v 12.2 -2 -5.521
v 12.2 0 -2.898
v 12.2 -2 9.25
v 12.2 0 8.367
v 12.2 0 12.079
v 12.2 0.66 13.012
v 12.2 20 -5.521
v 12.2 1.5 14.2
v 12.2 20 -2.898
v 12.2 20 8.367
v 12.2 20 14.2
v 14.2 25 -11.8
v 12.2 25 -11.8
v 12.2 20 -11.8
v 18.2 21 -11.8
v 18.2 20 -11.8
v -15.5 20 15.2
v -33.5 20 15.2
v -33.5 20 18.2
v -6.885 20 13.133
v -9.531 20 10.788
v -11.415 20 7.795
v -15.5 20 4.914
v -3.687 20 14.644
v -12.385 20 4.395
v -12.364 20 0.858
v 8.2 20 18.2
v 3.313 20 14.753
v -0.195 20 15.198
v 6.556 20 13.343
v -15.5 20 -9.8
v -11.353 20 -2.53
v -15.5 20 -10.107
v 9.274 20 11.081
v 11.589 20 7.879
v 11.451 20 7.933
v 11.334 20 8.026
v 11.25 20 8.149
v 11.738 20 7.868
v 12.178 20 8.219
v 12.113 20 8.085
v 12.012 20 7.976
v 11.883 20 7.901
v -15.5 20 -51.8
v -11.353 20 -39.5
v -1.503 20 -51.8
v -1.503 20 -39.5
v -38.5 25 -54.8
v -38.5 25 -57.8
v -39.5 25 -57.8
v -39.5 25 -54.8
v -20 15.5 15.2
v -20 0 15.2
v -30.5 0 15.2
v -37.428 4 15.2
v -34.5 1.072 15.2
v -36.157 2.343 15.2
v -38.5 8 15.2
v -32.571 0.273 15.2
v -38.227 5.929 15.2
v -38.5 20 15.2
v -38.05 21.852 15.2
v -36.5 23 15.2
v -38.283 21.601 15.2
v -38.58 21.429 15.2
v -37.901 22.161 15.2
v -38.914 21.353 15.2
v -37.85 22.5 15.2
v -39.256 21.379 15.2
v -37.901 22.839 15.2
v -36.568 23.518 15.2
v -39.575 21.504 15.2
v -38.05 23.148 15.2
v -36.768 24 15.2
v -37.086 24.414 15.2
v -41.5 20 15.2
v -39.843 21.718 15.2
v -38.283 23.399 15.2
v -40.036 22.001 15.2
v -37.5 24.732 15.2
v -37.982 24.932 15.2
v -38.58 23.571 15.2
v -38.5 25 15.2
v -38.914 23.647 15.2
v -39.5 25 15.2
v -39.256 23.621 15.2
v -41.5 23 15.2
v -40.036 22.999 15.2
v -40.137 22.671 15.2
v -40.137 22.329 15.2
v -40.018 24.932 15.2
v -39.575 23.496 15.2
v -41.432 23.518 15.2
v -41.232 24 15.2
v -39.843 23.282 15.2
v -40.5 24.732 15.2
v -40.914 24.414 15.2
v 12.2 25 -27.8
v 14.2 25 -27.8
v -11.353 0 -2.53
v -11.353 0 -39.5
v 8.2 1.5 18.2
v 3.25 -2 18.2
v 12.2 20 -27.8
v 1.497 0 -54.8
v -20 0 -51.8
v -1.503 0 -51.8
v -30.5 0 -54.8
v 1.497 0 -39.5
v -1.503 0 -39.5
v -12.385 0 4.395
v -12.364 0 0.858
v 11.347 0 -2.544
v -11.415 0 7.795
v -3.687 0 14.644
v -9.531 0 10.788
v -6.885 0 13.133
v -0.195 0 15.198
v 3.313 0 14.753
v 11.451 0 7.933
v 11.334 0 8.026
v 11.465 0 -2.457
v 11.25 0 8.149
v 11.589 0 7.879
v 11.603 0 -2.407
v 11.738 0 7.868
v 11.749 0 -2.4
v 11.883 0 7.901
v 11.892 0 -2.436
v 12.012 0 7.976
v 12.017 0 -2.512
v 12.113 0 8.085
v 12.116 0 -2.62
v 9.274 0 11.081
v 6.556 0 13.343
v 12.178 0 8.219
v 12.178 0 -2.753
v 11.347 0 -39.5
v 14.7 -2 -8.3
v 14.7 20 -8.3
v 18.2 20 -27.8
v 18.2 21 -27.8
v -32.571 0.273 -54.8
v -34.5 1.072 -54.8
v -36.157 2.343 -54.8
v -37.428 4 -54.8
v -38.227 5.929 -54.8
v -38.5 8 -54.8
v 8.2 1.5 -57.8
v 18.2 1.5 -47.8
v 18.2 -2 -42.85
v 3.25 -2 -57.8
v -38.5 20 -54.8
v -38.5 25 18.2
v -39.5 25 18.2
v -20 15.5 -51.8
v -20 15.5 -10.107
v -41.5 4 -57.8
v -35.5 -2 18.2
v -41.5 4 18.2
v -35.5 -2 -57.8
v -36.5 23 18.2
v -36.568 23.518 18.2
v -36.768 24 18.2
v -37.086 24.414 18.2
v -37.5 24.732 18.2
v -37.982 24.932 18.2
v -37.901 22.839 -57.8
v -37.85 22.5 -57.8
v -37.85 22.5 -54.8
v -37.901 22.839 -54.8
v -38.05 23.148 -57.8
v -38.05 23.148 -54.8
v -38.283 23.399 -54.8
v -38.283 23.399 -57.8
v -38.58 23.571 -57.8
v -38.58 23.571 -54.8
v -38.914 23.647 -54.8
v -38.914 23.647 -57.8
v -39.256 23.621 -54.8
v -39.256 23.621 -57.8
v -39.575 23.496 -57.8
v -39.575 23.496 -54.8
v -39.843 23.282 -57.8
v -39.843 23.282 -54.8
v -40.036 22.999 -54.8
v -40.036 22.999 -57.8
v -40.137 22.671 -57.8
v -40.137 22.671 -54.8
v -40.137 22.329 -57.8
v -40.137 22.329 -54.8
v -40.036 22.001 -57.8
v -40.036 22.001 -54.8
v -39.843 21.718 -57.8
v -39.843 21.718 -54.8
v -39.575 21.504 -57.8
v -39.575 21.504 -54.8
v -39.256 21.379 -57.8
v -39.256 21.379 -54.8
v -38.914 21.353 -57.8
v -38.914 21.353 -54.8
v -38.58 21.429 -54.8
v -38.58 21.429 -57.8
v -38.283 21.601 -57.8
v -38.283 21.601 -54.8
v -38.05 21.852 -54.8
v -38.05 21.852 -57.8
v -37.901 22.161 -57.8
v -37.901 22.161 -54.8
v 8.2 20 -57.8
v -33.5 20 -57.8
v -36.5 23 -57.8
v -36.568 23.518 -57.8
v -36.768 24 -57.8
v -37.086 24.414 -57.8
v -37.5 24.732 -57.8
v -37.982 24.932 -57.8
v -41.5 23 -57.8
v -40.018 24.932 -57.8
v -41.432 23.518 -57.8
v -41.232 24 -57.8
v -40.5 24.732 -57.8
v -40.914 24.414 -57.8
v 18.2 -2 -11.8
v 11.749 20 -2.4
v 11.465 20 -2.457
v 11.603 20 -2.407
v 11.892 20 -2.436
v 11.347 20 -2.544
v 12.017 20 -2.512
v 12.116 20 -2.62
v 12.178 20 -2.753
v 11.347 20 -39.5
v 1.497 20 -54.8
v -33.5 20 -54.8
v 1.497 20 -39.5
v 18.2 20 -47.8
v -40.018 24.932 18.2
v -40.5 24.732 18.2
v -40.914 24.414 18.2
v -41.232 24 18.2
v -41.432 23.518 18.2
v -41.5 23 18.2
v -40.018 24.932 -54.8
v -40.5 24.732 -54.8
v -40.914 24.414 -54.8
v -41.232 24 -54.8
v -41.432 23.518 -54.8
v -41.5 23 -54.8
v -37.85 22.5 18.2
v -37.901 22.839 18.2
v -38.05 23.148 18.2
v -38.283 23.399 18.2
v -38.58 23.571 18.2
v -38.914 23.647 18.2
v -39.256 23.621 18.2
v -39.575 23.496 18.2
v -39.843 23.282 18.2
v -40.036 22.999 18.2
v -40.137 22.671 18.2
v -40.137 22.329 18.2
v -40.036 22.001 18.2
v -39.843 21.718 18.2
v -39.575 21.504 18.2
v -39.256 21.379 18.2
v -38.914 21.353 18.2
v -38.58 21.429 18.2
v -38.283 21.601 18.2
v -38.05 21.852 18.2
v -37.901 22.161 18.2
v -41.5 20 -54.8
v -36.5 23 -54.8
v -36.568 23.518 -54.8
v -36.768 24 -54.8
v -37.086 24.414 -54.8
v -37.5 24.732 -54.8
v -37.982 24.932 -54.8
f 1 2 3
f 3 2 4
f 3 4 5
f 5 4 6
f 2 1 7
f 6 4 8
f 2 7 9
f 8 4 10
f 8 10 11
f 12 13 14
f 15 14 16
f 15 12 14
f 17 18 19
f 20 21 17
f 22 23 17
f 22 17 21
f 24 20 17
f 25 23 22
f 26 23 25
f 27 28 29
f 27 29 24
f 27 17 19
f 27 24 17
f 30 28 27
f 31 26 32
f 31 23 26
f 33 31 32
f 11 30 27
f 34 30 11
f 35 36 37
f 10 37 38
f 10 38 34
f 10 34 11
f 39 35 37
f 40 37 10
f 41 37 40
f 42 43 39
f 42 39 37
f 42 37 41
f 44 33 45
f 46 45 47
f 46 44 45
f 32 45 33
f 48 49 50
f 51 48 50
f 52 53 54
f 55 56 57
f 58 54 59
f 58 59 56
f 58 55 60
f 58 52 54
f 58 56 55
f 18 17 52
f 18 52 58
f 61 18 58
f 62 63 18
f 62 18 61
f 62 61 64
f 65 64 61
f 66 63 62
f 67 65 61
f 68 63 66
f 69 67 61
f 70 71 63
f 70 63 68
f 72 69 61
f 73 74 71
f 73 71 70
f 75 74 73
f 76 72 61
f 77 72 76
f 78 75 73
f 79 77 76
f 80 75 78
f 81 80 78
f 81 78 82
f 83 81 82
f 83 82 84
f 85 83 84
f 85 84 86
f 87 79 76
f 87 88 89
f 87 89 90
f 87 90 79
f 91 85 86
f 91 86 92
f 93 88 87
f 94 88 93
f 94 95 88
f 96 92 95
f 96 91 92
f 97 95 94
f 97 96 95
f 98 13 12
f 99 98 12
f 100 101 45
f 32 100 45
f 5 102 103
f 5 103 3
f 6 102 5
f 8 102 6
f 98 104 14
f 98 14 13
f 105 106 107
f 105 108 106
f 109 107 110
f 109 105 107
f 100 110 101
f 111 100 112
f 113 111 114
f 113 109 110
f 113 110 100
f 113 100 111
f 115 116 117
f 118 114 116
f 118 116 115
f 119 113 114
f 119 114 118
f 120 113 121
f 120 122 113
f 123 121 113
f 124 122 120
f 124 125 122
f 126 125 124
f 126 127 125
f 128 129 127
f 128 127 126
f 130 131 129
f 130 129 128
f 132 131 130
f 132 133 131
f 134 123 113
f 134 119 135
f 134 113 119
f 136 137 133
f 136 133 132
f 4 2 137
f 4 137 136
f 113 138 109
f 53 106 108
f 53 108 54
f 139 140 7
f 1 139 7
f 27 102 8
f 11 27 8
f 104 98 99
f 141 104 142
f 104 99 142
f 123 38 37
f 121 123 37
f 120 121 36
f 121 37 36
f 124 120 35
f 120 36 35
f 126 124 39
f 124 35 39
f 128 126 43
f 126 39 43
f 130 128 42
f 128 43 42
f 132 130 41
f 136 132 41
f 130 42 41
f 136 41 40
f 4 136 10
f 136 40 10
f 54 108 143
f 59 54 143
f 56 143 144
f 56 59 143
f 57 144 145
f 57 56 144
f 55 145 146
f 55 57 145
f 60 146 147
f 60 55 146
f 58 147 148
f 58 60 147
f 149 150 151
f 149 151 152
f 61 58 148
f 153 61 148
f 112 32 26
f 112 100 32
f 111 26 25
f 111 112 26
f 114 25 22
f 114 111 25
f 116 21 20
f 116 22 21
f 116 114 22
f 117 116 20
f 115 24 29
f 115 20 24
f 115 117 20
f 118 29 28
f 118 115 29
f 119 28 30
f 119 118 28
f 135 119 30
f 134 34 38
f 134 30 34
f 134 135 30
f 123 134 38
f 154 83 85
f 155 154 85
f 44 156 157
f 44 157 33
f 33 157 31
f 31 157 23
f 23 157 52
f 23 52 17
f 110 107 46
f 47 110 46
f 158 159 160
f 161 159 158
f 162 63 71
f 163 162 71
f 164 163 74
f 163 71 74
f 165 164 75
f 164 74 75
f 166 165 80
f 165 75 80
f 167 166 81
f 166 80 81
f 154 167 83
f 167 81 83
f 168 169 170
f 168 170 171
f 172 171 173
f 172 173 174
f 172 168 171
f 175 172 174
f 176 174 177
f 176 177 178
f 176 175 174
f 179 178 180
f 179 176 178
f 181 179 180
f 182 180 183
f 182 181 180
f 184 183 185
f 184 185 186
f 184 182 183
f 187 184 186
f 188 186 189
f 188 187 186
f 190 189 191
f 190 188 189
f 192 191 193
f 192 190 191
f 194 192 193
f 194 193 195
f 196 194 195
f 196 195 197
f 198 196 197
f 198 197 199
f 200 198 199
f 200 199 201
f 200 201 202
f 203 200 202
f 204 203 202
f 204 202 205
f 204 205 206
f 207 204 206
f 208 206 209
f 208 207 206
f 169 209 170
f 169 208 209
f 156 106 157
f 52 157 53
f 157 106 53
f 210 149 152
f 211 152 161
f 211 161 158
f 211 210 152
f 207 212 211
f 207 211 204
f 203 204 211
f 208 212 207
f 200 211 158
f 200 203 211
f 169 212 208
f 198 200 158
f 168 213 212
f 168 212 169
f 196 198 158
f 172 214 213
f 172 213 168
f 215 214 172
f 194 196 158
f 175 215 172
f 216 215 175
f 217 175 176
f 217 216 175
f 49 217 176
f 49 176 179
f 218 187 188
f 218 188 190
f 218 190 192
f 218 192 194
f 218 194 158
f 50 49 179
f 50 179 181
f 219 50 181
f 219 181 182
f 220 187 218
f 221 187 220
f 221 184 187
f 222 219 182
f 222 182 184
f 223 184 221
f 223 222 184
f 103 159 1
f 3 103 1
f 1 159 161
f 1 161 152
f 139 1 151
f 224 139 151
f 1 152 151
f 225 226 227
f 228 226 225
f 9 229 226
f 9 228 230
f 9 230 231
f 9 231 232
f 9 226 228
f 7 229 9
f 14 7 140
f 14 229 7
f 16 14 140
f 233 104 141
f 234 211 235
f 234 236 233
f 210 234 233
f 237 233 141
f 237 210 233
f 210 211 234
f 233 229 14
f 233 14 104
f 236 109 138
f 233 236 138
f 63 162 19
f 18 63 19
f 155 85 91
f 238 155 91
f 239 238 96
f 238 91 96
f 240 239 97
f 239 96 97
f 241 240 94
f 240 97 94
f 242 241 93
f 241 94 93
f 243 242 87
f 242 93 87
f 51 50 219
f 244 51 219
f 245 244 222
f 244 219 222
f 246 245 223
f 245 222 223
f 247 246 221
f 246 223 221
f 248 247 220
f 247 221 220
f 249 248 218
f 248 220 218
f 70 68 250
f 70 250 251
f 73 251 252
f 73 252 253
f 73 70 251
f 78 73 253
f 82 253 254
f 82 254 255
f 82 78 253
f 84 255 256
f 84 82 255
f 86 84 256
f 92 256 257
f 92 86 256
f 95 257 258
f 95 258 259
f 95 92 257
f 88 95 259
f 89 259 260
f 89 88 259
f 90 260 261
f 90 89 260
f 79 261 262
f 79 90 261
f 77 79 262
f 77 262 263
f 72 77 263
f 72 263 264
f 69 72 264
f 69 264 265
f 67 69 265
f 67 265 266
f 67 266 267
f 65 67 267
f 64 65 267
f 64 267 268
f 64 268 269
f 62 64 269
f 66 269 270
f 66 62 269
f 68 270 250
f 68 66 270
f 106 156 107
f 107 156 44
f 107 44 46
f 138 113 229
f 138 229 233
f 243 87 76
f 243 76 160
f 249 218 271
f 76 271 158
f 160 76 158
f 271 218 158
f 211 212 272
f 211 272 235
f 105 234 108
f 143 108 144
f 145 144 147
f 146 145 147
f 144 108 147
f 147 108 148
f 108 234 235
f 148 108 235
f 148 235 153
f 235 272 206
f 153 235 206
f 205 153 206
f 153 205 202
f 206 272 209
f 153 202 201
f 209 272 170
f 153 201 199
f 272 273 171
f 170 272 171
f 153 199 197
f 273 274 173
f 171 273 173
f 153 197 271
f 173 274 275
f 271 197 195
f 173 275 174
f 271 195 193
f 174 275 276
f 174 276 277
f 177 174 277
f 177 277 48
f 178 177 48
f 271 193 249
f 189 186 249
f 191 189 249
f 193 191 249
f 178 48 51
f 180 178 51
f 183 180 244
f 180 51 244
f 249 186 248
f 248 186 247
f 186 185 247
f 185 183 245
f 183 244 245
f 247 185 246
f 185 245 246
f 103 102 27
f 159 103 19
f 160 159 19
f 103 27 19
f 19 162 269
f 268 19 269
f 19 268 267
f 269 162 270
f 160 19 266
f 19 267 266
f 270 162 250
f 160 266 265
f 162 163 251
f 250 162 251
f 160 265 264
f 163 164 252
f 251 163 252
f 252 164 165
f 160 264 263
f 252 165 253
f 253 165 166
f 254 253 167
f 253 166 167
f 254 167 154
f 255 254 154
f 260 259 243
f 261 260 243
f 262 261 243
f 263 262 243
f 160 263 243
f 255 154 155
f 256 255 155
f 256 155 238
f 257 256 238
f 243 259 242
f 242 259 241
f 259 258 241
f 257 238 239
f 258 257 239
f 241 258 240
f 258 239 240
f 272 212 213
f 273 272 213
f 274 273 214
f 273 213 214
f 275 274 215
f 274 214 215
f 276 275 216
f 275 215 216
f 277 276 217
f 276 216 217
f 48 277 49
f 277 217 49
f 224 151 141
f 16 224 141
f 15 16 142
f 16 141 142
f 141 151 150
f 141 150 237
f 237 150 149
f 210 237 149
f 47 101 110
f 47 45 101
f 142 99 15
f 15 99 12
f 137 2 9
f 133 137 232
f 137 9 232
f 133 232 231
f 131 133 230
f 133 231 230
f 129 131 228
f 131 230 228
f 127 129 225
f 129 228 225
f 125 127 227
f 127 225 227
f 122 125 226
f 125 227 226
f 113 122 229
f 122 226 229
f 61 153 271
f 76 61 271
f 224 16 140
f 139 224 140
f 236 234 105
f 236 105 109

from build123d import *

# Parameters (mm, degrees)
BOSS_EXTRUDE1_START       = 10
SKETCH1_R                 = 1.15
BOSS_EXTRUDE1_DEPTH       = 76
SKETCH2_W                 = 6
SKETCH2_H                 = 16.4
CUT_EXTRUDE1_DEPTH        = 76
BOSS_EXTRUDE2_START       = -47.8
BOSS_EXTRUDE2_DEPTH       = 37.686187853
BOSS_EXTRUDE2_START_2     = -51.8
BOSS_EXTRUDE2_2_OUTLINE_W = 9.85
BOSS_EXTRUDE2_2_OUTLINE_H = 20
BOSS_EXTRUDE2_2_DEPTH     = 12.300000091
BOSS_EXTRUDE2_START_3     = -57.8
BOSS_EXTRUDE2_3_OUTLINE_R = 1.15
BOSS_EXTRUDE2_3_DEPTH     = 3
BOSS_EXTRUDE2_START_4     = 15.2
BOSS_EXTRUDE2_4_OUTLINE_R = 1.15
BOSS_EXTRUDE2_4_DEPTH     = 3
BOSS_EXTRUDE2_START_5     = -27.8
BOSS_EXTRUDE2_5_OUTLINE_W = 6
BOSS_EXTRUDE2_5_OUTLINE_H = 5
BOSS_EXTRUDE2_5_DEPTH     = 16
BOSS_EXTRUDE2_START_6     = -11.8
BOSS_EXTRUDE2_6_DEPTH     = 1.69328026
BOSS_EXTRUDE2_START_7     = -2
BOSS_EXTRUDE2_7_OUTLINE_W = 3
BOSS_EXTRUDE2_7_OUTLINE_H = 10
BOSS_EXTRUDE2_7_DEPTH     = 22
BOSS_EXTRUDE2_8_DEPTH     = 2
BOSS_EXTRUDE2_START_8     = -39.951533137
BOSS_EXTRUDE2_9_OUTLINE_W = 10
BOSS_EXTRUDE2_9_OUTLINE_H = 25.30671974
BOSS_EXTRUDE2_9_DEPTH     = 14.849242405
CHAMFER1_SIZE             = 10
CHAMFER2_SIZE             = 4
CHAMFER3_SIZE             = 4
SKETCH4_W                 = 5
SKETCH4_H                 = 3.2
CUT_EXTRUDE2_DEPTH        = 17
SKETCH5_W                 = 92.220715814
SKETCH5_H                 = 108.753281114
CUT_EXTRUDE3_DEPTH        = 17
BOSS_EXTRUDE3_DEPTH       = 3
BOSS_EXTRUDE4_DEPTH       = 3
CUT_EXTRUDE5_DEPTH        = 26
FILLET1_R                 = 0.5
FILLET2_R                 = 8
CHAMFER4_SIZE             = 6
CHAMFER6_SIZE             = 3.5
BOSS_EXTRUDE6_DEPTH       = 20
CUT_EXTRUDE10_DEPTH       = 34
SKETCH14_W                = 6.88450438
SKETCH14_H                = 12.178080633
CUT_EXTRUDE11_DEPTH       = 5
FILLET3_R                 = 0.5


with BuildPart() as part:
    # Sketch1 → Boss-Extrude1 (new body)
    with BuildSketch(Plane(origin=(0, 0, -57.8), x_dir=(-1, 0, 0), z_dir=(0, 0, -1)).offset(BOSS_EXTRUDE1_START)):
        with BuildLine():
            Line((39, 25), (-18.2, 25))
            Line((-18.2, 25), (-18.2, 20))
            Line((-18.2, 20), (39, 20))
            ThreePointArc((39, 20), (41.5, 22.5), (39, 25))
        make_face()
        with Locations((39, 22.5)):
            Circle(SKETCH1_R, mode=Mode.SUBTRACT)
    extrude(amount=BOSS_EXTRUDE1_DEPTH)

    # Sketch2 → Cut-Extrude1 (cut)
    with BuildSketch(Plane(origin=(0, 25, 0), x_dir=(1, 0, 0), z_dir=(0, 1, 0))):
        with Locations((15.2, 105.8)):
            Rectangle(SKETCH2_W, SKETCH2_H)
    extrude(amount=-CUT_EXTRUDE1_DEPTH, mode=Mode.SUBTRACT)

    # Chamfer1
    chamfer1_edges = [part.edges().sort_by_distance(p)[0] for p in [
        (18.2, 22.5, -143.8),
        (18.2, 22.5, -67.8),
    ]]
    chamfer(chamfer1_edges, length=CHAMFER1_SIZE)

    # Chamfer2
    chamfer2_edges = [part.edges().sort_by_distance(p)[0] for p in [
        (18.2, 25, -87.7),
        (18.2, 25, -123.9),
    ]]
    chamfer(chamfer2_edges, length=CHAMFER2_SIZE)

    # Sketch4 → Cut-Extrude2 (cut)
    with BuildSketch(Plane(origin=(0, 25, 0), x_dir=(1, 0, 0), z_dir=(0, 1, 0))):
        with Locations((-39, 69.4)):
            Rectangle(SKETCH4_W, SKETCH4_H)
        with Locations((-39, 142.2)):
            Rectangle(SKETCH4_W, SKETCH4_H)
    extrude(amount=-CUT_EXTRUDE2_DEPTH, mode=Mode.SUBTRACT)

    # Sketch5 → Cut-Extrude3 (cut)
    with BuildSketch(Plane(origin=(0, 25, 0), x_dir=(1, 0, 0), z_dir=(0, 1, 0))):
        with Locations((-7.000216009, 117.176640557)):
            Rectangle(SKETCH5_W, SKETCH5_H)
    extrude(amount=-CUT_EXTRUDE3_DEPTH, mode=Mode.SUBTRACT)


with BuildPart() as body_2:
    # Boss-Extrude2: read off the stored shape, not the designer's step
    # Boss-Extrude2 outline → Boss-Extrude2 (new body)
    with BuildSketch(Plane.XY.offset(BOSS_EXTRUDE2_START)):
        Polygon((18.2, -2), (18.2, 20), (11.34684114, 20), (11.34684114, 0), (-11.35315886, 0), (-11.35315886, 20), (-15.5, 20), (-20, 15.5), (-20, 0), (-38.5, 0), (-38.5, 20), (-41.5, 20), (-41.5, -2), align=None)
    extrude(amount=BOSS_EXTRUDE2_DEPTH)

    # Boss-Extrude2 2 outline → Boss-Extrude2 2 (add)
    with BuildSketch(Plane.XY.offset(BOSS_EXTRUDE2_START_2)):
        with Locations((6.42184114, 10)):
            Rectangle(BOSS_EXTRUDE2_2_OUTLINE_W, BOSS_EXTRUDE2_2_OUTLINE_H)
        Polygon((-1.50315886, 0), (-1.50315886, 20), (-15.5, 20), (-20, 15.5), (-20, 0), align=None)
    extrude(amount=BOSS_EXTRUDE2_2_DEPTH)

    # Boss-Extrude2 5 outline → Boss-Extrude2 5 (add)
    with BuildSketch(Plane.XY.offset(BOSS_EXTRUDE2_START_5)):
        with Locations((15.2, 22.5)):
            Rectangle(BOSS_EXTRUDE2_5_OUTLINE_W, BOSS_EXTRUDE2_5_OUTLINE_H)
    extrude(amount=BOSS_EXTRUDE2_5_DEPTH)

    # Boss-Extrude2 6 outline → Boss-Extrude2 6 (add)
    with BuildSketch(Plane.XY.offset(BOSS_EXTRUDE2_START_6)):
        Polygon((-11.35315886, 0), (-11.35315886, 20), (-15.5, 20), (-20, 15.5), (-20, 0), align=None)
    extrude(amount=BOSS_EXTRUDE2_6_DEPTH)



with BuildPart() as body_3:
    # Boss-Extrude2 3 outline → Boss-Extrude2 3 (new body)
    with BuildSketch(Plane.XY.offset(BOSS_EXTRUDE2_START_3)):
        with BuildLine():
            Line((1.49684114, 0), (1.49684114, 20))
            Line((1.49684114, 20), (-36.5, 20))
            Line((-36.5, 20), (-36.5, 23))
            ThreePointArc((-36.5, 23), (-37.085786438, 24.414213562), (-38.5, 25))
            Line((-38.5, 25), (-39.5, 25))
            ThreePointArc((-39.5, 25), (-40.914213562, 24.414213562), (-41.5, 23))
            Line((-41.5, 23), (-41.5, 20))
            Line((-41.5, 20), (-38.5, 20))
            Line((-38.5, 20), (-38.5, 0))
            Line((-38.5, 0), (1.49684114, 0))
        make_face()
        with Locations((-39, 22.5)):
            Circle(BOSS_EXTRUDE2_3_OUTLINE_R, mode=Mode.SUBTRACT)
    extrude(amount=BOSS_EXTRUDE2_3_DEPTH)


with BuildPart() as body_4:
    # Boss-Extrude2 4 outline → Boss-Extrude2 4 (new body)
    with BuildSketch(Plane.XY.offset(BOSS_EXTRUDE2_START_4)):
        with BuildLine():
            Line((1.49684114, 0), (1.49684114, 20))
            Line((1.49684114, 20), (-36.5, 20))
            Line((-36.5, 20), (-36.5, 23))
            ThreePointArc((-36.5, 23), (-37.085786438, 24.414213562), (-38.5, 25))
            Line((-38.5, 25), (-39.5, 25))
            ThreePointArc((-39.5, 25), (-40.914213562, 24.414213562), (-41.5, 23))
            Line((-41.5, 23), (-41.5, 20))
            Line((-41.5, 20), (-38.5, 20))
            Line((-38.5, 20), (-38.5, 0))
            Line((-38.5, 0), (1.49684114, 0))
        make_face()
        with Locations((-39, 22.5)):
            Circle(BOSS_EXTRUDE2_4_OUTLINE_R, mode=Mode.SUBTRACT)
    extrude(amount=BOSS_EXTRUDE2_4_DEPTH)


with BuildPart() as body_2_1:
    add(body_2.part)

    add(body_3.part)  # Boss-Extrude2 7 merges body 3

    add(body_4.part)  # Boss-Extrude2 7 merges body 4
    # Boss-Extrude2 7 outline → Boss-Extrude2 7 (add)
    with BuildSketch(Plane(origin=(0, 0, 0), x_dir=(1, 0, 0), z_dir=(0, 1, 0)).offset(BOSS_EXTRUDE2_START_7)):
        Polygon((18.2, 47.8), (8.2, 57.8), (1.49684114, 57.8), (1.49684114, 47.8), align=None)
        with BuildLine():
            Line((18.2, -8.2), (18.2, 10.113812147))
            Line((18.2, 10.113812147), (11.34684114, 10.113812147))
            ThreePointArc((11.34684114, 10.113812147), (0.0047491, -15.199999258), (-11.35315886, 10.10671974))
            Line((-11.35315886, 10.10671974), (-20, 10.10671974))
            Line((-20, 10.10671974), (-20, -15.2))
            Line((-20, -15.2), (-38.5, -15.2))
            Line((-38.5, -15.2), (-38.5, 10.113812147))
            Line((-38.5, 10.113812147), (-41.5, 10.113812147))
            Line((-41.5, 10.113812147), (-41.5, -18.2))
            Line((-41.5, -18.2), (8.2, -18.2))
            Line((8.2, -18.2), (18.2, -8.2))
        make_face()
        with Locations((-40, 52.8)):
            Rectangle(BOSS_EXTRUDE2_7_OUTLINE_W, BOSS_EXTRUDE2_7_OUTLINE_H)
    extrude(amount=BOSS_EXTRUDE2_7_DEPTH)

    # Boss-Extrude2 8 outline → Boss-Extrude2 8 (add)
    with BuildSketch(Plane(origin=(0, 0, 0), x_dir=(1, 0, 0), z_dir=(0, 1, 0)).offset(BOSS_EXTRUDE2_START_7)):
        Polygon((1.49684114, 47.8), (1.49684114, 57.8), (-38.5, 57.8), (-38.5, 47.8), (-20, 47.8), align=None)
        with BuildLine():
            Line((11.34684114, 10.113812147), (-38.5, 10.113812147))
            Line((-38.5, 10.113812147), (-38.5, -15.2))
            Line((-38.5, -15.2), (-20, -15.2))
            Line((-20, -15.2), (-20, 10.10671974))
            Line((-20, 10.10671974), (-11.35315886, 10.10671974))
            ThreePointArc((-11.35315886, 10.10671974), (0.0047491, -15.199999258), (11.34684114, 10.113812147))
        make_face()
    extrude(amount=BOSS_EXTRUDE2_8_DEPTH)

    # Boss-Extrude2 9 outline → Boss-Extrude2 9 (cut)
    with BuildSketch(Plane(origin=(0, 0, 0), x_dir=(0.7071067811865474, 0.7071067811865477, 0), z_dir=(0.7071067811865476, -0.7071067811865476, 0)).offset(BOSS_EXTRUDE2_START_8)):
        with Locations((0, 2.54664013)):
            Rectangle(BOSS_EXTRUDE2_9_OUTLINE_W, BOSS_EXTRUDE2_9_OUTLINE_H)
    extrude(amount=BOSS_EXTRUDE2_9_DEPTH, mode=Mode.SUBTRACT)

    # Chamfer3
    chamfer3_edges = [body_2_1.edges().sort_by_distance(p)[0] for p in [
        (18.2, 25, -19.8),
    ]]
    chamfer(chamfer3_edges, length=CHAMFER3_SIZE)

    # Sketch6 → Boss-Extrude3 (add)
    with BuildSketch(Plane.XY.offset(18.2)):
        Polygon((-36.5, 23), (-33.5, 20), (-37.431383681, 19.25446979), align=None)
    extrude(amount=-BOSS_EXTRUDE3_DEPTH)

    # Sketch7 → Boss-Extrude4 (add)
    with BuildSketch(Plane(origin=(0, 0, -57.8), x_dir=(-1, 0, 0), z_dir=(0, 0, -1))):
        Polygon((36.5, 23), (33.5, 20), (37.220279648, 19.344567212), align=None)
    extrude(amount=-BOSS_EXTRUDE4_DEPTH)

    # Sketch8 → Cut-Extrude5 (cut)
    with BuildSketch(Plane(origin=(0, 20, 0), x_dir=(1, 0, 0), z_dir=(0, 1, 0))):
        Polygon((18.2, 11.8), (14.7, 8.3), (14.7, -21.501109559), (24.075722879, -13.334137275), (24.580871836, 10.828821177), align=None)
    extrude(amount=-CUT_EXTRUDE5_DEPTH, mode=Mode.SUBTRACT)

    # Fillet1
    fillet1_edges = [body_2_1.edges().sort_by_distance(p)[0] for p in [
        (14.7, 10, -3.866522986),
        (14.7, 10, 3.866522986),
    ]]
    fillet(fillet1_edges, radius=FILLET1_R)

    # Fillet2
    fillet2_edges = [body_2_1.edges().sort_by_distance(p)[0] for p in [
        (-38.5, 0, -19.8),
    ]]
    fillet(fillet2_edges, radius=FILLET2_R)

    # Chamfer4
    chamfer4_edges = [body_2_1.edges().sort_by_distance(p)[0] for p in [
        (-41.5, -2, -19.8),
    ]]
    chamfer(chamfer4_edges, length=CHAMFER4_SIZE)

    # Chamfer6
    chamfer6_edges = [body_2_1.edges().sort_by_distance(p)[0] for p in [
        (13.2, -2, -52.8),
        (11.45, -2, 14.95),
    ]]
    chamfer(chamfer6_edges, length=CHAMFER6_SIZE)

    # Sketch12 → Boss-Extrude6 (add)
    with BuildSketch(Plane(origin=(0, 0, 0), x_dir=(1, 0, 0), z_dir=(0, 1, 0))):
        with BuildLine():
            Line((0, -16.836473334), (-10.35781432, -16.574633061))
            Line((-10.35781432, -16.574633061), (-15.5, -4.91441497))
            Line((-15.5, -4.91441497), (-15.5, 9.8))
            Line((-15.5, 9.8), (-11.35315886, 10.10671974))
            Line((-11.35315886, 10.10671974), (-11.35315886, 2.5302757))
            ThreePointArc((-11.35315886, 2.5302757), (0.007539589, -15.199997726), (11.34684114, 2.543967596))
            Line((11.34684114, 2.543967596), (11.34684114, 10.113812147))
            Line((11.34684114, 10.113812147), (14.7, 8.3))
            Line((14.7, 8.3), (14.7, -11.7))
            Line((14.7, -11.7), (4.492447971, -17.057179979))
            Line((4.492447971, -17.057179979), (0, -16.836473334))
        make_face()
    extrude(amount=BOSS_EXTRUDE6_DEPTH)

    # Sketch13 → Cut-Extrude10 (cut)
    with BuildSketch(Plane(origin=(0, 20, 0), x_dir=(1, 0, 0), z_dir=(0, 1, 0))):
        Polygon((14.7, 8.3), (12.2, 5.521362845), (12.2, -21.090159973), (18.418004591, -14.179128538), align=None)
    extrude(amount=-CUT_EXTRUDE10_DEPTH, mode=Mode.SUBTRACT)

    # Sketch14 → Cut-Extrude11 (cut)
    with BuildSketch(Plane(origin=(6.069669914, -8.583809512, 6.069669914), x_dir=(0.8660254037844393, 0.40824829046386313, -0.28867513459481114), z_dir=(0.49999999999999906, -0.7071067811865493, 0.49999999999999833))):
        with Locations((7.600391897, 9.638669458)):
            Rectangle(SKETCH14_W, SKETCH14_H)
    extrude(amount=CUT_EXTRUDE11_DEPTH, mode=Mode.SUBTRACT)

    # Fillet3
    # the kernel refuses this fillet: 0.5 mm, written as the material it takes off along each edge
    with BuildSketch(Plane(origin=(12.2, 27.361092772, 5.422131518), x_dir=(0, 0, 1), z_dir=(0, -1, 0))) as fillet3_piece_1:
        with BuildLine():
            CenterArc((2.944437109, 0.5), FILLET3_R, 115.841932763, 154.158067237)
            ThreePointArc((2.726492162, 0.95), (1.39076711, 0.396014873), (0, 0))
            Line((0, 0), (2.944437109, 0))
        make_face()
    extrude(amount=27.361092772, mode=Mode.SUBTRACT)
    with BuildSketch(Plane(origin=(12.2, 27.189458898, -0.022131518), x_dir=(0, 0, -1), z_dir=(0, -1, 0))) as fillet3_piece_2:
        with BuildLine():
            CenterArc((2.875783559, -0.5), FILLET3_R, 90, 134.936099196)
            ThreePointArc((2.521836078, -0.85315886), (1.28369596, -0.359250606), (0, 0))
            Line((0, 0), (2.875783559, 0))
        make_face()
    extrude(amount=27.189458898, mode=Mode.SUBTRACT)


solid = body_2_1.part
